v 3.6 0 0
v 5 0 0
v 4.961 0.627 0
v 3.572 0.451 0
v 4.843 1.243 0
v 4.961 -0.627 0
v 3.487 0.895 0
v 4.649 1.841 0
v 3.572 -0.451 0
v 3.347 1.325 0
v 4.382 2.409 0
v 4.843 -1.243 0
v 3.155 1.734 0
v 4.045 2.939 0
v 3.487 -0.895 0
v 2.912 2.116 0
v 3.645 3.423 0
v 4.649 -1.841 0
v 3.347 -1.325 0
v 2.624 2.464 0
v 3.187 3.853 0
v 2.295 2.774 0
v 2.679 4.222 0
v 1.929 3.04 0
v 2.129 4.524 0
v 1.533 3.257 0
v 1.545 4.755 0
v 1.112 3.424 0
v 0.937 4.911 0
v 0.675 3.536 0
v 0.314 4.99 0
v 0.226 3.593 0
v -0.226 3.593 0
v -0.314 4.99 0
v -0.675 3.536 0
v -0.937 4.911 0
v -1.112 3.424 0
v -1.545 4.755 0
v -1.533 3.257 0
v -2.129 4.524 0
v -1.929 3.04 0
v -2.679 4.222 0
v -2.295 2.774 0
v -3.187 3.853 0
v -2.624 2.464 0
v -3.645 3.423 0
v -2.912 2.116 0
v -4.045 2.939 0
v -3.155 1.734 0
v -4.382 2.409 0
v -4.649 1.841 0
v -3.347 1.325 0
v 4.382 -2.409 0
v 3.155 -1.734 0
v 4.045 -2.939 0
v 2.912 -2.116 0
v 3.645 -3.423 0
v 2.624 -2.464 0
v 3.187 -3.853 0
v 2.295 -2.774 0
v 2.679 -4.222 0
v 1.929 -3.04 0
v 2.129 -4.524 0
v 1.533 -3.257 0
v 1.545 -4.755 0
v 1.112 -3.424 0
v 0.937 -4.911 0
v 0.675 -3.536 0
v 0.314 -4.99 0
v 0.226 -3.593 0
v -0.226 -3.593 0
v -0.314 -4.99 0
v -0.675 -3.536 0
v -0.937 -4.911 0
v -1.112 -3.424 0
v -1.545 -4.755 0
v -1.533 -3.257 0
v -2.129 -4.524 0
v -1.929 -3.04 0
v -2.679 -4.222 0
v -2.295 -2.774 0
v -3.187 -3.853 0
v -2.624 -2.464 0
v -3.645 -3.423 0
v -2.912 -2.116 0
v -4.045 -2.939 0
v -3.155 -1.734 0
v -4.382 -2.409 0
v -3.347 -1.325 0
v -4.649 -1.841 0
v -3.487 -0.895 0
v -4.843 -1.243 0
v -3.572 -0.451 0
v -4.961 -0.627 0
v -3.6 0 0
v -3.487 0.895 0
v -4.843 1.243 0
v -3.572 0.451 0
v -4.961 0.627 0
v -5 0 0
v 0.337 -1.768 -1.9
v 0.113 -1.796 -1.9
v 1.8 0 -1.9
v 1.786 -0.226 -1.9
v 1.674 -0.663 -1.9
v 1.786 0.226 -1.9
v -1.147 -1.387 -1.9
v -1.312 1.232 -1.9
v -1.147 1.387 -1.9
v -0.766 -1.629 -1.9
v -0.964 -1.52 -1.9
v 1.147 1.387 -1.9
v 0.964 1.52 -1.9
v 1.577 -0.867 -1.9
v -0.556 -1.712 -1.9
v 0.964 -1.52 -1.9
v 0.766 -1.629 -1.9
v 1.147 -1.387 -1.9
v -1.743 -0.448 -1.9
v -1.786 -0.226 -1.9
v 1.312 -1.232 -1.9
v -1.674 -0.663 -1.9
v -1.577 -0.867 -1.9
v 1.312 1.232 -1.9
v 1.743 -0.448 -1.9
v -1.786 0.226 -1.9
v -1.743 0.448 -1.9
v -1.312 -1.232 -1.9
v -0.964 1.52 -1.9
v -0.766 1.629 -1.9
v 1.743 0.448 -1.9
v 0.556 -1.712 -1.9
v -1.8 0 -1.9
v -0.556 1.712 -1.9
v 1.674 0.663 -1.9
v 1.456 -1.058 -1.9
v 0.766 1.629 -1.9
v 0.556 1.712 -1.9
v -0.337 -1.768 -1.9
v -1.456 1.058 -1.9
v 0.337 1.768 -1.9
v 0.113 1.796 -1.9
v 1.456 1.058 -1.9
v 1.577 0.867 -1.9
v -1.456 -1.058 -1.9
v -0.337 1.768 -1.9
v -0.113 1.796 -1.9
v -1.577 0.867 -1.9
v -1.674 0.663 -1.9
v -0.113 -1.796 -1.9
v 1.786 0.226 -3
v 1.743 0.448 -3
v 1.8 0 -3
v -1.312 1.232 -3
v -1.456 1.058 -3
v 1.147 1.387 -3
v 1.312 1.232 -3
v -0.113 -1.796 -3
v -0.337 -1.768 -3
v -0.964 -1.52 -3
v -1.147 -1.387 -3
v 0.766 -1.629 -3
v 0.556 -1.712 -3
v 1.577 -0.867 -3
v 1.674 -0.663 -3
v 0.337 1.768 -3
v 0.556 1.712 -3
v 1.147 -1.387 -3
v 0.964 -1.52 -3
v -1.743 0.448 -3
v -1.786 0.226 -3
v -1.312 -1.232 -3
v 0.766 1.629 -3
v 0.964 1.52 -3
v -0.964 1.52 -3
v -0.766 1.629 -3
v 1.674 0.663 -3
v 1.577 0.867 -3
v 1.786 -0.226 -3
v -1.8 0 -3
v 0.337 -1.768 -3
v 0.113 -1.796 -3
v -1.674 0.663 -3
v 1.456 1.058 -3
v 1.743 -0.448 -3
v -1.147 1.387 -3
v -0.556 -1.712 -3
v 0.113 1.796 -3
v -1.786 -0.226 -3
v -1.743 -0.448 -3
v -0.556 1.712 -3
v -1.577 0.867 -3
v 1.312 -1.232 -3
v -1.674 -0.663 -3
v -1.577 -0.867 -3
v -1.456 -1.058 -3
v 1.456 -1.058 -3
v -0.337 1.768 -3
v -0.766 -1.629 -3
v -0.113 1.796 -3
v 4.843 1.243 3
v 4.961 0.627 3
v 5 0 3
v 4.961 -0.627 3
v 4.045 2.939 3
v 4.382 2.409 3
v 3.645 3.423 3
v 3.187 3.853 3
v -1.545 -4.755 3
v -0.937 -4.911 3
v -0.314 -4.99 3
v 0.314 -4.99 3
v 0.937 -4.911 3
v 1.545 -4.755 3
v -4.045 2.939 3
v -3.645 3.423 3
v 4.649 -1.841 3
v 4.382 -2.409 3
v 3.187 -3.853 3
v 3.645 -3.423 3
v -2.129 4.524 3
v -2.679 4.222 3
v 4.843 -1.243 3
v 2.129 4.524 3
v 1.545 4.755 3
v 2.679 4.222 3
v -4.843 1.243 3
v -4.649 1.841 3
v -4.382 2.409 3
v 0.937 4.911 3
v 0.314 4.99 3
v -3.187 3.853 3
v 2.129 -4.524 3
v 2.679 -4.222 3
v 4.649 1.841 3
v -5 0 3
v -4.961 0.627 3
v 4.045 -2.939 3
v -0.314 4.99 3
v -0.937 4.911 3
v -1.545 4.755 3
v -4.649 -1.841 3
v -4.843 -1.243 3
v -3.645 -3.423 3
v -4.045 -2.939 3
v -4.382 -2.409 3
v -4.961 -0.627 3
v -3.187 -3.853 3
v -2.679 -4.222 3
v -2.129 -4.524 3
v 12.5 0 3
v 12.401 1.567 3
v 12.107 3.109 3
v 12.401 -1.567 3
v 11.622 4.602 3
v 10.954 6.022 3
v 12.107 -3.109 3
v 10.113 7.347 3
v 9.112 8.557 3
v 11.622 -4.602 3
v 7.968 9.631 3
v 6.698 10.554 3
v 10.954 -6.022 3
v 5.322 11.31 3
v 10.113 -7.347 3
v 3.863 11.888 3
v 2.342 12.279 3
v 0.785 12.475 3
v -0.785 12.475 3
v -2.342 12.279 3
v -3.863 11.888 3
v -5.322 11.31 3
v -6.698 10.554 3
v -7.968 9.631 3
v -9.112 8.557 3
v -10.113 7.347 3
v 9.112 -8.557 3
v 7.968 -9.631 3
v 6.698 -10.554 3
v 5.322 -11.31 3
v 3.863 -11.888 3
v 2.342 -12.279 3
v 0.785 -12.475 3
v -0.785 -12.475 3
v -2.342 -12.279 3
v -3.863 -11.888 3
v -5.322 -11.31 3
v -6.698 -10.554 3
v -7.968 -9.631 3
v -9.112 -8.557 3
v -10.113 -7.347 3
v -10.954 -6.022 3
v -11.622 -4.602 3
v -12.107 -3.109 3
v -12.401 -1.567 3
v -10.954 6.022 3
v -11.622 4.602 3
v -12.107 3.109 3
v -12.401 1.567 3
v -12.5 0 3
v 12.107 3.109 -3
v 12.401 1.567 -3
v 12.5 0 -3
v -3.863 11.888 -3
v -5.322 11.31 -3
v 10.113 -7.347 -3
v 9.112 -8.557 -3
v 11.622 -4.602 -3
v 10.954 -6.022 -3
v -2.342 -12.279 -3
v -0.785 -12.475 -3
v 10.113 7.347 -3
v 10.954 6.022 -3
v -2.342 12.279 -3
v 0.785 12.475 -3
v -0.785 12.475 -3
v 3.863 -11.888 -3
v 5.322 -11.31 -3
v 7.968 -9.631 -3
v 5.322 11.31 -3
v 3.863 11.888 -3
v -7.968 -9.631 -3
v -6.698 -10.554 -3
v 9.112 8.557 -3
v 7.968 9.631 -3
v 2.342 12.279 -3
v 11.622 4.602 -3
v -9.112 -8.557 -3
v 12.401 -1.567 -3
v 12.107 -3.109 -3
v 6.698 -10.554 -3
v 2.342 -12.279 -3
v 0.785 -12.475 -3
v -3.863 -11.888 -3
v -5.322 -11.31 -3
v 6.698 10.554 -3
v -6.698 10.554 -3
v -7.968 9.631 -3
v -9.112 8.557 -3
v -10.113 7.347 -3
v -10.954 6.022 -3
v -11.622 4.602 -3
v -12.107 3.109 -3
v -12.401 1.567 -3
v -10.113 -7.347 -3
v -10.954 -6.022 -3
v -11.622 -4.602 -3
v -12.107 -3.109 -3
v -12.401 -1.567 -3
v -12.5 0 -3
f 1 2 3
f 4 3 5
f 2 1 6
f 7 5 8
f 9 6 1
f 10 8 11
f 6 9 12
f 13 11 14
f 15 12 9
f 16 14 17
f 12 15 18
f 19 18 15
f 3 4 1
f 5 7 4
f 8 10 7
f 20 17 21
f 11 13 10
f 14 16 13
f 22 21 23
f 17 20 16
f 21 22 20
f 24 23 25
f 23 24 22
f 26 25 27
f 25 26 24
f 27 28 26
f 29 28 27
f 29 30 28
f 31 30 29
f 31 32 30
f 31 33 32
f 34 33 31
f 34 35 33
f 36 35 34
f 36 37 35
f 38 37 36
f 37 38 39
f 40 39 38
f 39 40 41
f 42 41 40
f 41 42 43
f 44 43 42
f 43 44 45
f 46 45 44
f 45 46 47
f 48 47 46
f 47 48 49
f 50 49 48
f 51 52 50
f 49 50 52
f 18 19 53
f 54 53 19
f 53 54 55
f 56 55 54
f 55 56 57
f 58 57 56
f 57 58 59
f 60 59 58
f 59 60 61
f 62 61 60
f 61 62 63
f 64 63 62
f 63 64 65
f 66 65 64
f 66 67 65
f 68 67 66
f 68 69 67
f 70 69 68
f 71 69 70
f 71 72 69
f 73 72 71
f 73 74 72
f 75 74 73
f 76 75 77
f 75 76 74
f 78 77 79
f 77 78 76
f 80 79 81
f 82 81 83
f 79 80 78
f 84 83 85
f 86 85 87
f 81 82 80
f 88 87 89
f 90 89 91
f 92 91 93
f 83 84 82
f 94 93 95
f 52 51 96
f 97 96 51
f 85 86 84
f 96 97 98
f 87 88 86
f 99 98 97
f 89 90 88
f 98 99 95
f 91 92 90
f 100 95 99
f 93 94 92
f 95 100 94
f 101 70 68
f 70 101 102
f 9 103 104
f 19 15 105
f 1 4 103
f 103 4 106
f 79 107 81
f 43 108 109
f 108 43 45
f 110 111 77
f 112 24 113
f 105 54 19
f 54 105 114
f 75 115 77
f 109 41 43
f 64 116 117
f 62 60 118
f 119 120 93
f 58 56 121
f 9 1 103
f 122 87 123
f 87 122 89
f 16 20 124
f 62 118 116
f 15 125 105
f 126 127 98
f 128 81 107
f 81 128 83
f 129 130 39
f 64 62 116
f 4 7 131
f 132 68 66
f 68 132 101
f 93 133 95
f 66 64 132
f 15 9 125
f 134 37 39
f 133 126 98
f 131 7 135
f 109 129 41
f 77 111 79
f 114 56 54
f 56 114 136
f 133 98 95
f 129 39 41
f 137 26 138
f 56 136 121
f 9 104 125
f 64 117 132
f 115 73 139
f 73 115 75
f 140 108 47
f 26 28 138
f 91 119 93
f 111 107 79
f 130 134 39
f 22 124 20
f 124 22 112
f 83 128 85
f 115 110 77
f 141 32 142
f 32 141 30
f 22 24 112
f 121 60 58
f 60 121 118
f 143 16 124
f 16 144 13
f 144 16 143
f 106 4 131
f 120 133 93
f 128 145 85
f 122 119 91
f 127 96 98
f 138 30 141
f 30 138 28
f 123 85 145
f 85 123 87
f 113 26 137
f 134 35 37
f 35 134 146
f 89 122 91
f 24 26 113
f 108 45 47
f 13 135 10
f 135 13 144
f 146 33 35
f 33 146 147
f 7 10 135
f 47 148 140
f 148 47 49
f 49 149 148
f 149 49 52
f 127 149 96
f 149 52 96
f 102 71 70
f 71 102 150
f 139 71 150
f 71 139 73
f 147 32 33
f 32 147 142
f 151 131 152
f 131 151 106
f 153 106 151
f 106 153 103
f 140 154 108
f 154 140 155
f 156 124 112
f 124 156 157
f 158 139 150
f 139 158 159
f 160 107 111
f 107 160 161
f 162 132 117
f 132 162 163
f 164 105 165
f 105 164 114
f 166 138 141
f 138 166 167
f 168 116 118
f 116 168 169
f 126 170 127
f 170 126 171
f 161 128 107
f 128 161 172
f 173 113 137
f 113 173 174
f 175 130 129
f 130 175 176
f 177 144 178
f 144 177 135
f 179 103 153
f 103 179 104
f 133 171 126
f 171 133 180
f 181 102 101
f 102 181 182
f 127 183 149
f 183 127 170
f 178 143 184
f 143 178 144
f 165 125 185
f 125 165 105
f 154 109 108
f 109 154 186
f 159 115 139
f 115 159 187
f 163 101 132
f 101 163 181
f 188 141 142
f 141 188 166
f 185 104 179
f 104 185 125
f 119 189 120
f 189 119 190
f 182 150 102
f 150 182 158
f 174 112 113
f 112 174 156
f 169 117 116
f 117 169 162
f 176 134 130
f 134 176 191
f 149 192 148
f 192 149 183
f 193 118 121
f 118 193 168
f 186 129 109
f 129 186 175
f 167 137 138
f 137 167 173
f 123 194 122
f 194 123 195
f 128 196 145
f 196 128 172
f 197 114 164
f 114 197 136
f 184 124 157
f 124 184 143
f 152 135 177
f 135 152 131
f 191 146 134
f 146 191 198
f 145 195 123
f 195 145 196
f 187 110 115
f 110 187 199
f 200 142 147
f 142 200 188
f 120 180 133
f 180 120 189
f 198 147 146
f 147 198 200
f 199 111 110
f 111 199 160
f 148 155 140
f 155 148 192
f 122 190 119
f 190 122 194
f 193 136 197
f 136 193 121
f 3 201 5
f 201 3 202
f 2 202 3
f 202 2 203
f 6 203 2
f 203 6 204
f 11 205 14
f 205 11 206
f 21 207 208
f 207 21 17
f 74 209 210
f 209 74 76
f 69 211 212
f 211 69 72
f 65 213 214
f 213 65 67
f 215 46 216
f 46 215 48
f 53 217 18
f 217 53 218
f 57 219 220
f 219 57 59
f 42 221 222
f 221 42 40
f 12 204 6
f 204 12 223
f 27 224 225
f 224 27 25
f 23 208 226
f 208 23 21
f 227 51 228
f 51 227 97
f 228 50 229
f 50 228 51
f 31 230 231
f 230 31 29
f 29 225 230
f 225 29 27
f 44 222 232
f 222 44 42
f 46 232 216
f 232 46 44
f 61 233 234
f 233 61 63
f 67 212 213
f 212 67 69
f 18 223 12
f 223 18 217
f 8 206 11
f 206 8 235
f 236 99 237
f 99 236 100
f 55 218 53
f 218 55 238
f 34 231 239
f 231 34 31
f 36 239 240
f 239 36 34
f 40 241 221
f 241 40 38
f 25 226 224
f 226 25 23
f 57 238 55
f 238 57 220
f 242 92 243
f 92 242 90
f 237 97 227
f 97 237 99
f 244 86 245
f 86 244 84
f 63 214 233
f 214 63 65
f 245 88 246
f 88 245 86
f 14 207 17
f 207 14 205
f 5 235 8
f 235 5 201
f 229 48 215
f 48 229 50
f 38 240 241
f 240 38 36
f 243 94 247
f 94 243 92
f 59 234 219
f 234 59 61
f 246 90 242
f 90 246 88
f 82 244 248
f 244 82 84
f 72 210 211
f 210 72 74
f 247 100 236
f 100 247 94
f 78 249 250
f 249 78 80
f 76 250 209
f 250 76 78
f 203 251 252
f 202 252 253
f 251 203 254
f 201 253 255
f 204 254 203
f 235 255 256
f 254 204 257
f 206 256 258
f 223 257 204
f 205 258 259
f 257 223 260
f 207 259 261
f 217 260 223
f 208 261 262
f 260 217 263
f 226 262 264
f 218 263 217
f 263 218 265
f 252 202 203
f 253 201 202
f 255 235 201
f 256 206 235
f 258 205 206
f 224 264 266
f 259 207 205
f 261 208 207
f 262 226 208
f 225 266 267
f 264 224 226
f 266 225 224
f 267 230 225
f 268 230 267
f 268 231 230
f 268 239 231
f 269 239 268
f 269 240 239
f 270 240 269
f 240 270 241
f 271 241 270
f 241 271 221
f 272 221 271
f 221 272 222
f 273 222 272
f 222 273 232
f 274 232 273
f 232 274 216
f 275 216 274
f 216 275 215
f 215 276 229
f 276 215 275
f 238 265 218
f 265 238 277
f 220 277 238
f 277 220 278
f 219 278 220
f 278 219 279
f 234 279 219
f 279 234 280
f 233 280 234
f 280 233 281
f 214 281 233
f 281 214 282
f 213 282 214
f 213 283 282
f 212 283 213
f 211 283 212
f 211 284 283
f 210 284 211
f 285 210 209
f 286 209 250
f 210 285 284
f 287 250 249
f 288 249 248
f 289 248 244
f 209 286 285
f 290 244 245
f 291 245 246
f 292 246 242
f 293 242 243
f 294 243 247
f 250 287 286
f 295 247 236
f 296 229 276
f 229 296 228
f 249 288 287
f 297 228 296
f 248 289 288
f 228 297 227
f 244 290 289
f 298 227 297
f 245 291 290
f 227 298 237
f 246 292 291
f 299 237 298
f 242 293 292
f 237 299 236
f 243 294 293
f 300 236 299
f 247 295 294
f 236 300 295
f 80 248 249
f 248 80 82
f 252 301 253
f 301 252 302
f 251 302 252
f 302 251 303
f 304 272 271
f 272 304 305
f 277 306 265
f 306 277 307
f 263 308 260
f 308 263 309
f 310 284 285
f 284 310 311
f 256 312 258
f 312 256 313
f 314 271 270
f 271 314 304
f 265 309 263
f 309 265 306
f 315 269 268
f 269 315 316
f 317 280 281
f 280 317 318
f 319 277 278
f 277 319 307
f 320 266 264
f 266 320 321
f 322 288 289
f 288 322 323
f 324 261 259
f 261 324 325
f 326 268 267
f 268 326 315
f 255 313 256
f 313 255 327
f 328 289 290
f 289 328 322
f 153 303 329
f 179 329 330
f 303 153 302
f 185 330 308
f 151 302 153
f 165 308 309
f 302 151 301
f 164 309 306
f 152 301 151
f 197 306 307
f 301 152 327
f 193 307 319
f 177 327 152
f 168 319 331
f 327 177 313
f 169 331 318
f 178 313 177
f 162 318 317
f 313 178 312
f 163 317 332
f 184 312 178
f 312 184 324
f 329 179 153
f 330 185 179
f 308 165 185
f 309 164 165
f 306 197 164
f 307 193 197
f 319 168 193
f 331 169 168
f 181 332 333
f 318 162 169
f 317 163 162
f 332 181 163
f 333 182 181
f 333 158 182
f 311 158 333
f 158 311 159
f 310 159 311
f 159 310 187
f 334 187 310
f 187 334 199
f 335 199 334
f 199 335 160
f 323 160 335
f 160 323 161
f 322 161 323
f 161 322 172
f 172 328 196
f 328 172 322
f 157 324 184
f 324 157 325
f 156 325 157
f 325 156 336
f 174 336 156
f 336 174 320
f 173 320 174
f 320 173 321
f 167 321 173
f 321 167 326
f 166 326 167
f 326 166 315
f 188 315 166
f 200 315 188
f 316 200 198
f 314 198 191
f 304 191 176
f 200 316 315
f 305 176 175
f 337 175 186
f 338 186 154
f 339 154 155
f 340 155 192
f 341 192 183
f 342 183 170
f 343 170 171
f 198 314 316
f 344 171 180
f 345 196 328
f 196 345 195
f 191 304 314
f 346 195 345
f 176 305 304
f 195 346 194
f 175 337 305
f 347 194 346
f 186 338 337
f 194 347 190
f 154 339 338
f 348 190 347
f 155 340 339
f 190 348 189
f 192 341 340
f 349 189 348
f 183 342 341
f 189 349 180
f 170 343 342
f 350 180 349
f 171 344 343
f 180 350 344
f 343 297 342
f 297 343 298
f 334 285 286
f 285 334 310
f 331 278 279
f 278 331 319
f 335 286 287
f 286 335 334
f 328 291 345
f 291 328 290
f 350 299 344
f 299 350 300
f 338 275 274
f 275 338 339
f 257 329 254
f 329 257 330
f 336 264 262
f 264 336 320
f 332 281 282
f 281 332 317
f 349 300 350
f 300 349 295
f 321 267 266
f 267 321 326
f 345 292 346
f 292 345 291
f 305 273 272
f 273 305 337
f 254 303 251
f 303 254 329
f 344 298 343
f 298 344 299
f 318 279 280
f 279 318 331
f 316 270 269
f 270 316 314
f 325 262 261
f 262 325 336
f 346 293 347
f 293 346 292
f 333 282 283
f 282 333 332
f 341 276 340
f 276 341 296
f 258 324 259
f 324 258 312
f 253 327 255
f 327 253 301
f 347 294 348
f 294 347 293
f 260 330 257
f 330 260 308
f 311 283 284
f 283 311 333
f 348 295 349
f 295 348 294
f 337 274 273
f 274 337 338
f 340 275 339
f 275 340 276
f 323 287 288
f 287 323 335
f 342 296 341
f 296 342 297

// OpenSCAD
$fn = 50;

difference() {
	union() {
		translate(v = [0, 0, -3.0]) {
			cylinder(h = 6, r = 12.5);
		}
	}
	union() {
		translate(v = [0, 0, 0]) {
			rotate(a = [0, 0, 0]) {
				difference() {
					union() {
						translate(v = [0, 0, -6.0]) {
							cylinder(h = 6, r = 1.5);
						}
						translate(v = [0, 0, -1.9]) {
							cylinder(h = 1.9, r1 = 1.8, r2 = 3.6);
						}
						translate(v = [0, 0, -6.0]) {
							cylinder(h = 6, r = 1.8);
						}
						translate(v = [0, 0, -6.0]) {
							cylinder(h = 6, r = 1.5);
						}
					}
					union();
				}
			}
		}
		#cylinder(h = 3, r = 5.0);
	}
}
